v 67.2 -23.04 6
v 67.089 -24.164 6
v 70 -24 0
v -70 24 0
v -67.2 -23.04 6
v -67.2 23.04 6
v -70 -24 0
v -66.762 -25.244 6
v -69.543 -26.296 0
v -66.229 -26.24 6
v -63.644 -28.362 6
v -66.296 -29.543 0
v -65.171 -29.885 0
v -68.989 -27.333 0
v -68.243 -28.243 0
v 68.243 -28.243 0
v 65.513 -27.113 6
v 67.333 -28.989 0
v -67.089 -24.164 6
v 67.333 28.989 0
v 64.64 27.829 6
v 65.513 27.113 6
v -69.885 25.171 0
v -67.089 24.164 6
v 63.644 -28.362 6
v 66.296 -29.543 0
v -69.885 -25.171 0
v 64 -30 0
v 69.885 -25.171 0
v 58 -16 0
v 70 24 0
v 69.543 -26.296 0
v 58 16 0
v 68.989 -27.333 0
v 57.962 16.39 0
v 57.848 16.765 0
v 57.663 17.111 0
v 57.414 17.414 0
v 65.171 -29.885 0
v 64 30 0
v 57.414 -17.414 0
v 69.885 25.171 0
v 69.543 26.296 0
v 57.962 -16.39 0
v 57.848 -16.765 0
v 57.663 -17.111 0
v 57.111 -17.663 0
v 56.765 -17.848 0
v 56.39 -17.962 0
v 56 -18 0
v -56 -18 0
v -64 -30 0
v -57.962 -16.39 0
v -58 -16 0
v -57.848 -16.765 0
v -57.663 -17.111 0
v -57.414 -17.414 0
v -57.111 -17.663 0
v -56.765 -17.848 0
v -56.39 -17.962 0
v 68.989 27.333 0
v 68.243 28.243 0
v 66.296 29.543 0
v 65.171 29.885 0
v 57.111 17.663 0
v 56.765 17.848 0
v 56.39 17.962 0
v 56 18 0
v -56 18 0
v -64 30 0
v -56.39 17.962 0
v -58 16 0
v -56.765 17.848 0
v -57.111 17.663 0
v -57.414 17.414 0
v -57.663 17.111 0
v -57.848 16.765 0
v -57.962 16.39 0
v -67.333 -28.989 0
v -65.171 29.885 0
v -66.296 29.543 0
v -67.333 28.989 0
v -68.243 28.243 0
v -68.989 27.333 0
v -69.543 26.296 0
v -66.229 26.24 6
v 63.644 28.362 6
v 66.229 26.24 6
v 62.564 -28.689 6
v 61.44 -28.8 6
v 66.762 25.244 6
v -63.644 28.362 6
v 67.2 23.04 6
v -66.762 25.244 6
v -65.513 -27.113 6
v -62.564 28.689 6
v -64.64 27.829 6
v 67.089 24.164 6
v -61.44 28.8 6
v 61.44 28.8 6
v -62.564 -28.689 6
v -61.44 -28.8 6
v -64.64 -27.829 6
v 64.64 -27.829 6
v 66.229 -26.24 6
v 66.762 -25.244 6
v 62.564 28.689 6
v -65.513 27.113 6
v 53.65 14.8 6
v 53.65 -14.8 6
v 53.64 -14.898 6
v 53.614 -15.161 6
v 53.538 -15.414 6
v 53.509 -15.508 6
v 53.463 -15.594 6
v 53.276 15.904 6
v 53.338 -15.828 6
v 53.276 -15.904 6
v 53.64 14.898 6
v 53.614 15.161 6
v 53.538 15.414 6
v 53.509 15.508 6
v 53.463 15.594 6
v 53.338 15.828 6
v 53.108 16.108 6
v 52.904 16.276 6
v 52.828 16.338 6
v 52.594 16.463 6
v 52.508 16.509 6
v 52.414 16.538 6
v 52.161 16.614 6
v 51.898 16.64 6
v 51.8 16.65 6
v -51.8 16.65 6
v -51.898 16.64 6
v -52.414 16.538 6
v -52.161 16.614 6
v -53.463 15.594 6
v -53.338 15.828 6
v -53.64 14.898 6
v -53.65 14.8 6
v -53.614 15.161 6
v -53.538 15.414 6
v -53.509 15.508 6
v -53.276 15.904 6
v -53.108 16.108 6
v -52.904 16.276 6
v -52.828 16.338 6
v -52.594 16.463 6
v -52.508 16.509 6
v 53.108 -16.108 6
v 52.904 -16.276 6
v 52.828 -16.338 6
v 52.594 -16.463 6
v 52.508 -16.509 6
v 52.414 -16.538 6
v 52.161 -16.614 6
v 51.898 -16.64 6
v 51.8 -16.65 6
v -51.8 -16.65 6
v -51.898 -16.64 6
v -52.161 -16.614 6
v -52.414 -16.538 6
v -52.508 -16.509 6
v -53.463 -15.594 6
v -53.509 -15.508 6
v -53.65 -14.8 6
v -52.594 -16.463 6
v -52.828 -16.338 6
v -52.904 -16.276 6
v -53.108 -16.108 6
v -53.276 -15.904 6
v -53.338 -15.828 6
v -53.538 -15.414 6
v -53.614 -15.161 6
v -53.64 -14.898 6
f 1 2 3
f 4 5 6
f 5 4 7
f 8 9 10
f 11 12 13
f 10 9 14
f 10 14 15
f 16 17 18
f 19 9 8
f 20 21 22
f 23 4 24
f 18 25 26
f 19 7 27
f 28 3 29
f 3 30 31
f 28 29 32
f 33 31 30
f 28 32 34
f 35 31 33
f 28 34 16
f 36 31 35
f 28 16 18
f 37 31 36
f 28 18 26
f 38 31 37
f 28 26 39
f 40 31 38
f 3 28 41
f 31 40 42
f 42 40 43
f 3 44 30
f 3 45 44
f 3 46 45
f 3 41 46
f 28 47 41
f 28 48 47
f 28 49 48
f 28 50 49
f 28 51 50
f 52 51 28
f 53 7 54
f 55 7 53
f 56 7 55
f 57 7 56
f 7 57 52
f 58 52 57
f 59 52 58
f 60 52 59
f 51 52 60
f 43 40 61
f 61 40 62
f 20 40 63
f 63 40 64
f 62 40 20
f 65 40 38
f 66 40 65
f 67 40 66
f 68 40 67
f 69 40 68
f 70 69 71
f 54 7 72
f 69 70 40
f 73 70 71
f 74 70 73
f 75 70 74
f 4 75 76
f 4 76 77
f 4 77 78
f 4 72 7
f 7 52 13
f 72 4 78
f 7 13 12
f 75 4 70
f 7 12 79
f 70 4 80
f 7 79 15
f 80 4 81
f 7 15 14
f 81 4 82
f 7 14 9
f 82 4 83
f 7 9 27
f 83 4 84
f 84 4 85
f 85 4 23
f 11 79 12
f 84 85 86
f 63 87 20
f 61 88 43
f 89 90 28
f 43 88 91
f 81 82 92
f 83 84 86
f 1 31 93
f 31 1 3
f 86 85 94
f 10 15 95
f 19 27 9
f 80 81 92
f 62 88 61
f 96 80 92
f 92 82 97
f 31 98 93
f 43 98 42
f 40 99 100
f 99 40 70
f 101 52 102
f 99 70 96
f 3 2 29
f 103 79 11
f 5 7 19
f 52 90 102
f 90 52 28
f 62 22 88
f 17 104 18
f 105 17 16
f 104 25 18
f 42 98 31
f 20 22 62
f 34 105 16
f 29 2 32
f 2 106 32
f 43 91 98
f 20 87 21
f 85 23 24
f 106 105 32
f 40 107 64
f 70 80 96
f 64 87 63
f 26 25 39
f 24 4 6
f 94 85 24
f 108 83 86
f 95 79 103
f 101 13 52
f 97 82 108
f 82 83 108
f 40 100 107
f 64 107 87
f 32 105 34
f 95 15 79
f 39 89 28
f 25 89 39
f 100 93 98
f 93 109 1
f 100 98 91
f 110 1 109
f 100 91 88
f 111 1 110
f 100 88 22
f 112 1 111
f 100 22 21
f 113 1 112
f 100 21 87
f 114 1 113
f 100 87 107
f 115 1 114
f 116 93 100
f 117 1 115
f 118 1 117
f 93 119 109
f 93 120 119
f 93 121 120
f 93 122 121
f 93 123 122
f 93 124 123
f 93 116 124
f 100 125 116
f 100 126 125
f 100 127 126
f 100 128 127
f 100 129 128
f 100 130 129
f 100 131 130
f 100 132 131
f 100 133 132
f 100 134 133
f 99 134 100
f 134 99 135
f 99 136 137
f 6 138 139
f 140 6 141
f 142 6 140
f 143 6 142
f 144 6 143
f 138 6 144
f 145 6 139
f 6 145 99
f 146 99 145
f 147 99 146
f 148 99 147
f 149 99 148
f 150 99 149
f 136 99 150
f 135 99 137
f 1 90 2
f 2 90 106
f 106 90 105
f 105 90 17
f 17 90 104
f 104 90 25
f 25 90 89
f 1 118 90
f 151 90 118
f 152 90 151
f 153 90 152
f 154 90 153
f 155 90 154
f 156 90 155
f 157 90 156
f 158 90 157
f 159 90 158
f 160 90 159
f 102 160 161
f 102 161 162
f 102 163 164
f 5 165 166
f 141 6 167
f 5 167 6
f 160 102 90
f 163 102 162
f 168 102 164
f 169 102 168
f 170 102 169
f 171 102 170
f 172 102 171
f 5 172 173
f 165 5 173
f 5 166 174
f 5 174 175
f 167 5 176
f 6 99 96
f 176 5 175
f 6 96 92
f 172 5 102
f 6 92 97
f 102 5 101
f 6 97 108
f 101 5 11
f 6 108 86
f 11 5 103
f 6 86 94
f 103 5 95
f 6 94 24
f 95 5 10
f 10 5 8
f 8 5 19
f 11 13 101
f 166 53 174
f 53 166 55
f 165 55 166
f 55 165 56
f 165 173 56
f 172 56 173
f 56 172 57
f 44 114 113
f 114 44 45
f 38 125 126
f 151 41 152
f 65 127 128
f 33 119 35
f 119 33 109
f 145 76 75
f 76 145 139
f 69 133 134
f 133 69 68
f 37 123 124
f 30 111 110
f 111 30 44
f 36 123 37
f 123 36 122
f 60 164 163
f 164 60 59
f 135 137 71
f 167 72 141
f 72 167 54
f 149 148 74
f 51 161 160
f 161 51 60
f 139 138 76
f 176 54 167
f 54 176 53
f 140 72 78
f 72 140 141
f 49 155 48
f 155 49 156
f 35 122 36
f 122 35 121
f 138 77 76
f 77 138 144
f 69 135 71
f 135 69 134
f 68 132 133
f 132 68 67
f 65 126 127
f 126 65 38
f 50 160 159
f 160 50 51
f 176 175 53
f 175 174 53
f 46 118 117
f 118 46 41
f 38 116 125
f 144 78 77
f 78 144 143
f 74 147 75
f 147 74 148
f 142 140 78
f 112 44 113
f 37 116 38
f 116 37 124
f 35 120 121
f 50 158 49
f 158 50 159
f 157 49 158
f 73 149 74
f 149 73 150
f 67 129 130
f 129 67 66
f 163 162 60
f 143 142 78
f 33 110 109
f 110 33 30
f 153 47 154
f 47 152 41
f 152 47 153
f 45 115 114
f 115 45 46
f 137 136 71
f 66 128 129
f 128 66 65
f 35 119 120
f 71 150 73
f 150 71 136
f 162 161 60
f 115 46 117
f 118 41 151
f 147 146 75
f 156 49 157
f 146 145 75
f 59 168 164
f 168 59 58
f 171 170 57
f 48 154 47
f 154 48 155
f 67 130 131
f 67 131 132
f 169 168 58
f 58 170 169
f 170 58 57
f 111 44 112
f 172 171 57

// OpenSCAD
$fn = 32;

// ----------------------------------------------------------------------
// Display bezel: 140 x 60 mm frame, opening 116x36 mm
// ----------------------------------------------------------------------

// --- parameters (mm) ---
length = 140;             // frame outside length, X
width = 60;               // frame outside width, Y
frame_w = 12;             // frame width
thickness = 6;            // frame thickness
corner_r = 6;             // outside corner radius
chamfer = 0.96;           // outer wall taper
funnel = 0.9;             // inner opening taper
opening_l = 116;          // opening length
opening_w = 36;           // opening width
inner_r = 2;              // opening corner radius

/* rounded-rectangle outlines, generated with loops */
module rounded_ring(l_nom, w_nom, r) {
  hull() {
    for (sx = [-1, 1]) for (sy = [-1, 1])
      translate([sx * (l_nom / 2 - r), sy * (w_nom / 2 - r)]) circle(r = r);
  }
}

difference() {
  /* frame body, drafted so the outer edge is a variable-depth chamfer */
  linear_extrude(height = thickness, scale = chamfer)
    rounded_ring(length, width, corner_r);
  /* viewing opening, drafted the other way for a funnel edge */
  linear_extrude(height = thickness + 2, scale = funnel)
    translate([0, 0, -1]) rounded_ring(opening_l, opening_w, inner_r);
}
